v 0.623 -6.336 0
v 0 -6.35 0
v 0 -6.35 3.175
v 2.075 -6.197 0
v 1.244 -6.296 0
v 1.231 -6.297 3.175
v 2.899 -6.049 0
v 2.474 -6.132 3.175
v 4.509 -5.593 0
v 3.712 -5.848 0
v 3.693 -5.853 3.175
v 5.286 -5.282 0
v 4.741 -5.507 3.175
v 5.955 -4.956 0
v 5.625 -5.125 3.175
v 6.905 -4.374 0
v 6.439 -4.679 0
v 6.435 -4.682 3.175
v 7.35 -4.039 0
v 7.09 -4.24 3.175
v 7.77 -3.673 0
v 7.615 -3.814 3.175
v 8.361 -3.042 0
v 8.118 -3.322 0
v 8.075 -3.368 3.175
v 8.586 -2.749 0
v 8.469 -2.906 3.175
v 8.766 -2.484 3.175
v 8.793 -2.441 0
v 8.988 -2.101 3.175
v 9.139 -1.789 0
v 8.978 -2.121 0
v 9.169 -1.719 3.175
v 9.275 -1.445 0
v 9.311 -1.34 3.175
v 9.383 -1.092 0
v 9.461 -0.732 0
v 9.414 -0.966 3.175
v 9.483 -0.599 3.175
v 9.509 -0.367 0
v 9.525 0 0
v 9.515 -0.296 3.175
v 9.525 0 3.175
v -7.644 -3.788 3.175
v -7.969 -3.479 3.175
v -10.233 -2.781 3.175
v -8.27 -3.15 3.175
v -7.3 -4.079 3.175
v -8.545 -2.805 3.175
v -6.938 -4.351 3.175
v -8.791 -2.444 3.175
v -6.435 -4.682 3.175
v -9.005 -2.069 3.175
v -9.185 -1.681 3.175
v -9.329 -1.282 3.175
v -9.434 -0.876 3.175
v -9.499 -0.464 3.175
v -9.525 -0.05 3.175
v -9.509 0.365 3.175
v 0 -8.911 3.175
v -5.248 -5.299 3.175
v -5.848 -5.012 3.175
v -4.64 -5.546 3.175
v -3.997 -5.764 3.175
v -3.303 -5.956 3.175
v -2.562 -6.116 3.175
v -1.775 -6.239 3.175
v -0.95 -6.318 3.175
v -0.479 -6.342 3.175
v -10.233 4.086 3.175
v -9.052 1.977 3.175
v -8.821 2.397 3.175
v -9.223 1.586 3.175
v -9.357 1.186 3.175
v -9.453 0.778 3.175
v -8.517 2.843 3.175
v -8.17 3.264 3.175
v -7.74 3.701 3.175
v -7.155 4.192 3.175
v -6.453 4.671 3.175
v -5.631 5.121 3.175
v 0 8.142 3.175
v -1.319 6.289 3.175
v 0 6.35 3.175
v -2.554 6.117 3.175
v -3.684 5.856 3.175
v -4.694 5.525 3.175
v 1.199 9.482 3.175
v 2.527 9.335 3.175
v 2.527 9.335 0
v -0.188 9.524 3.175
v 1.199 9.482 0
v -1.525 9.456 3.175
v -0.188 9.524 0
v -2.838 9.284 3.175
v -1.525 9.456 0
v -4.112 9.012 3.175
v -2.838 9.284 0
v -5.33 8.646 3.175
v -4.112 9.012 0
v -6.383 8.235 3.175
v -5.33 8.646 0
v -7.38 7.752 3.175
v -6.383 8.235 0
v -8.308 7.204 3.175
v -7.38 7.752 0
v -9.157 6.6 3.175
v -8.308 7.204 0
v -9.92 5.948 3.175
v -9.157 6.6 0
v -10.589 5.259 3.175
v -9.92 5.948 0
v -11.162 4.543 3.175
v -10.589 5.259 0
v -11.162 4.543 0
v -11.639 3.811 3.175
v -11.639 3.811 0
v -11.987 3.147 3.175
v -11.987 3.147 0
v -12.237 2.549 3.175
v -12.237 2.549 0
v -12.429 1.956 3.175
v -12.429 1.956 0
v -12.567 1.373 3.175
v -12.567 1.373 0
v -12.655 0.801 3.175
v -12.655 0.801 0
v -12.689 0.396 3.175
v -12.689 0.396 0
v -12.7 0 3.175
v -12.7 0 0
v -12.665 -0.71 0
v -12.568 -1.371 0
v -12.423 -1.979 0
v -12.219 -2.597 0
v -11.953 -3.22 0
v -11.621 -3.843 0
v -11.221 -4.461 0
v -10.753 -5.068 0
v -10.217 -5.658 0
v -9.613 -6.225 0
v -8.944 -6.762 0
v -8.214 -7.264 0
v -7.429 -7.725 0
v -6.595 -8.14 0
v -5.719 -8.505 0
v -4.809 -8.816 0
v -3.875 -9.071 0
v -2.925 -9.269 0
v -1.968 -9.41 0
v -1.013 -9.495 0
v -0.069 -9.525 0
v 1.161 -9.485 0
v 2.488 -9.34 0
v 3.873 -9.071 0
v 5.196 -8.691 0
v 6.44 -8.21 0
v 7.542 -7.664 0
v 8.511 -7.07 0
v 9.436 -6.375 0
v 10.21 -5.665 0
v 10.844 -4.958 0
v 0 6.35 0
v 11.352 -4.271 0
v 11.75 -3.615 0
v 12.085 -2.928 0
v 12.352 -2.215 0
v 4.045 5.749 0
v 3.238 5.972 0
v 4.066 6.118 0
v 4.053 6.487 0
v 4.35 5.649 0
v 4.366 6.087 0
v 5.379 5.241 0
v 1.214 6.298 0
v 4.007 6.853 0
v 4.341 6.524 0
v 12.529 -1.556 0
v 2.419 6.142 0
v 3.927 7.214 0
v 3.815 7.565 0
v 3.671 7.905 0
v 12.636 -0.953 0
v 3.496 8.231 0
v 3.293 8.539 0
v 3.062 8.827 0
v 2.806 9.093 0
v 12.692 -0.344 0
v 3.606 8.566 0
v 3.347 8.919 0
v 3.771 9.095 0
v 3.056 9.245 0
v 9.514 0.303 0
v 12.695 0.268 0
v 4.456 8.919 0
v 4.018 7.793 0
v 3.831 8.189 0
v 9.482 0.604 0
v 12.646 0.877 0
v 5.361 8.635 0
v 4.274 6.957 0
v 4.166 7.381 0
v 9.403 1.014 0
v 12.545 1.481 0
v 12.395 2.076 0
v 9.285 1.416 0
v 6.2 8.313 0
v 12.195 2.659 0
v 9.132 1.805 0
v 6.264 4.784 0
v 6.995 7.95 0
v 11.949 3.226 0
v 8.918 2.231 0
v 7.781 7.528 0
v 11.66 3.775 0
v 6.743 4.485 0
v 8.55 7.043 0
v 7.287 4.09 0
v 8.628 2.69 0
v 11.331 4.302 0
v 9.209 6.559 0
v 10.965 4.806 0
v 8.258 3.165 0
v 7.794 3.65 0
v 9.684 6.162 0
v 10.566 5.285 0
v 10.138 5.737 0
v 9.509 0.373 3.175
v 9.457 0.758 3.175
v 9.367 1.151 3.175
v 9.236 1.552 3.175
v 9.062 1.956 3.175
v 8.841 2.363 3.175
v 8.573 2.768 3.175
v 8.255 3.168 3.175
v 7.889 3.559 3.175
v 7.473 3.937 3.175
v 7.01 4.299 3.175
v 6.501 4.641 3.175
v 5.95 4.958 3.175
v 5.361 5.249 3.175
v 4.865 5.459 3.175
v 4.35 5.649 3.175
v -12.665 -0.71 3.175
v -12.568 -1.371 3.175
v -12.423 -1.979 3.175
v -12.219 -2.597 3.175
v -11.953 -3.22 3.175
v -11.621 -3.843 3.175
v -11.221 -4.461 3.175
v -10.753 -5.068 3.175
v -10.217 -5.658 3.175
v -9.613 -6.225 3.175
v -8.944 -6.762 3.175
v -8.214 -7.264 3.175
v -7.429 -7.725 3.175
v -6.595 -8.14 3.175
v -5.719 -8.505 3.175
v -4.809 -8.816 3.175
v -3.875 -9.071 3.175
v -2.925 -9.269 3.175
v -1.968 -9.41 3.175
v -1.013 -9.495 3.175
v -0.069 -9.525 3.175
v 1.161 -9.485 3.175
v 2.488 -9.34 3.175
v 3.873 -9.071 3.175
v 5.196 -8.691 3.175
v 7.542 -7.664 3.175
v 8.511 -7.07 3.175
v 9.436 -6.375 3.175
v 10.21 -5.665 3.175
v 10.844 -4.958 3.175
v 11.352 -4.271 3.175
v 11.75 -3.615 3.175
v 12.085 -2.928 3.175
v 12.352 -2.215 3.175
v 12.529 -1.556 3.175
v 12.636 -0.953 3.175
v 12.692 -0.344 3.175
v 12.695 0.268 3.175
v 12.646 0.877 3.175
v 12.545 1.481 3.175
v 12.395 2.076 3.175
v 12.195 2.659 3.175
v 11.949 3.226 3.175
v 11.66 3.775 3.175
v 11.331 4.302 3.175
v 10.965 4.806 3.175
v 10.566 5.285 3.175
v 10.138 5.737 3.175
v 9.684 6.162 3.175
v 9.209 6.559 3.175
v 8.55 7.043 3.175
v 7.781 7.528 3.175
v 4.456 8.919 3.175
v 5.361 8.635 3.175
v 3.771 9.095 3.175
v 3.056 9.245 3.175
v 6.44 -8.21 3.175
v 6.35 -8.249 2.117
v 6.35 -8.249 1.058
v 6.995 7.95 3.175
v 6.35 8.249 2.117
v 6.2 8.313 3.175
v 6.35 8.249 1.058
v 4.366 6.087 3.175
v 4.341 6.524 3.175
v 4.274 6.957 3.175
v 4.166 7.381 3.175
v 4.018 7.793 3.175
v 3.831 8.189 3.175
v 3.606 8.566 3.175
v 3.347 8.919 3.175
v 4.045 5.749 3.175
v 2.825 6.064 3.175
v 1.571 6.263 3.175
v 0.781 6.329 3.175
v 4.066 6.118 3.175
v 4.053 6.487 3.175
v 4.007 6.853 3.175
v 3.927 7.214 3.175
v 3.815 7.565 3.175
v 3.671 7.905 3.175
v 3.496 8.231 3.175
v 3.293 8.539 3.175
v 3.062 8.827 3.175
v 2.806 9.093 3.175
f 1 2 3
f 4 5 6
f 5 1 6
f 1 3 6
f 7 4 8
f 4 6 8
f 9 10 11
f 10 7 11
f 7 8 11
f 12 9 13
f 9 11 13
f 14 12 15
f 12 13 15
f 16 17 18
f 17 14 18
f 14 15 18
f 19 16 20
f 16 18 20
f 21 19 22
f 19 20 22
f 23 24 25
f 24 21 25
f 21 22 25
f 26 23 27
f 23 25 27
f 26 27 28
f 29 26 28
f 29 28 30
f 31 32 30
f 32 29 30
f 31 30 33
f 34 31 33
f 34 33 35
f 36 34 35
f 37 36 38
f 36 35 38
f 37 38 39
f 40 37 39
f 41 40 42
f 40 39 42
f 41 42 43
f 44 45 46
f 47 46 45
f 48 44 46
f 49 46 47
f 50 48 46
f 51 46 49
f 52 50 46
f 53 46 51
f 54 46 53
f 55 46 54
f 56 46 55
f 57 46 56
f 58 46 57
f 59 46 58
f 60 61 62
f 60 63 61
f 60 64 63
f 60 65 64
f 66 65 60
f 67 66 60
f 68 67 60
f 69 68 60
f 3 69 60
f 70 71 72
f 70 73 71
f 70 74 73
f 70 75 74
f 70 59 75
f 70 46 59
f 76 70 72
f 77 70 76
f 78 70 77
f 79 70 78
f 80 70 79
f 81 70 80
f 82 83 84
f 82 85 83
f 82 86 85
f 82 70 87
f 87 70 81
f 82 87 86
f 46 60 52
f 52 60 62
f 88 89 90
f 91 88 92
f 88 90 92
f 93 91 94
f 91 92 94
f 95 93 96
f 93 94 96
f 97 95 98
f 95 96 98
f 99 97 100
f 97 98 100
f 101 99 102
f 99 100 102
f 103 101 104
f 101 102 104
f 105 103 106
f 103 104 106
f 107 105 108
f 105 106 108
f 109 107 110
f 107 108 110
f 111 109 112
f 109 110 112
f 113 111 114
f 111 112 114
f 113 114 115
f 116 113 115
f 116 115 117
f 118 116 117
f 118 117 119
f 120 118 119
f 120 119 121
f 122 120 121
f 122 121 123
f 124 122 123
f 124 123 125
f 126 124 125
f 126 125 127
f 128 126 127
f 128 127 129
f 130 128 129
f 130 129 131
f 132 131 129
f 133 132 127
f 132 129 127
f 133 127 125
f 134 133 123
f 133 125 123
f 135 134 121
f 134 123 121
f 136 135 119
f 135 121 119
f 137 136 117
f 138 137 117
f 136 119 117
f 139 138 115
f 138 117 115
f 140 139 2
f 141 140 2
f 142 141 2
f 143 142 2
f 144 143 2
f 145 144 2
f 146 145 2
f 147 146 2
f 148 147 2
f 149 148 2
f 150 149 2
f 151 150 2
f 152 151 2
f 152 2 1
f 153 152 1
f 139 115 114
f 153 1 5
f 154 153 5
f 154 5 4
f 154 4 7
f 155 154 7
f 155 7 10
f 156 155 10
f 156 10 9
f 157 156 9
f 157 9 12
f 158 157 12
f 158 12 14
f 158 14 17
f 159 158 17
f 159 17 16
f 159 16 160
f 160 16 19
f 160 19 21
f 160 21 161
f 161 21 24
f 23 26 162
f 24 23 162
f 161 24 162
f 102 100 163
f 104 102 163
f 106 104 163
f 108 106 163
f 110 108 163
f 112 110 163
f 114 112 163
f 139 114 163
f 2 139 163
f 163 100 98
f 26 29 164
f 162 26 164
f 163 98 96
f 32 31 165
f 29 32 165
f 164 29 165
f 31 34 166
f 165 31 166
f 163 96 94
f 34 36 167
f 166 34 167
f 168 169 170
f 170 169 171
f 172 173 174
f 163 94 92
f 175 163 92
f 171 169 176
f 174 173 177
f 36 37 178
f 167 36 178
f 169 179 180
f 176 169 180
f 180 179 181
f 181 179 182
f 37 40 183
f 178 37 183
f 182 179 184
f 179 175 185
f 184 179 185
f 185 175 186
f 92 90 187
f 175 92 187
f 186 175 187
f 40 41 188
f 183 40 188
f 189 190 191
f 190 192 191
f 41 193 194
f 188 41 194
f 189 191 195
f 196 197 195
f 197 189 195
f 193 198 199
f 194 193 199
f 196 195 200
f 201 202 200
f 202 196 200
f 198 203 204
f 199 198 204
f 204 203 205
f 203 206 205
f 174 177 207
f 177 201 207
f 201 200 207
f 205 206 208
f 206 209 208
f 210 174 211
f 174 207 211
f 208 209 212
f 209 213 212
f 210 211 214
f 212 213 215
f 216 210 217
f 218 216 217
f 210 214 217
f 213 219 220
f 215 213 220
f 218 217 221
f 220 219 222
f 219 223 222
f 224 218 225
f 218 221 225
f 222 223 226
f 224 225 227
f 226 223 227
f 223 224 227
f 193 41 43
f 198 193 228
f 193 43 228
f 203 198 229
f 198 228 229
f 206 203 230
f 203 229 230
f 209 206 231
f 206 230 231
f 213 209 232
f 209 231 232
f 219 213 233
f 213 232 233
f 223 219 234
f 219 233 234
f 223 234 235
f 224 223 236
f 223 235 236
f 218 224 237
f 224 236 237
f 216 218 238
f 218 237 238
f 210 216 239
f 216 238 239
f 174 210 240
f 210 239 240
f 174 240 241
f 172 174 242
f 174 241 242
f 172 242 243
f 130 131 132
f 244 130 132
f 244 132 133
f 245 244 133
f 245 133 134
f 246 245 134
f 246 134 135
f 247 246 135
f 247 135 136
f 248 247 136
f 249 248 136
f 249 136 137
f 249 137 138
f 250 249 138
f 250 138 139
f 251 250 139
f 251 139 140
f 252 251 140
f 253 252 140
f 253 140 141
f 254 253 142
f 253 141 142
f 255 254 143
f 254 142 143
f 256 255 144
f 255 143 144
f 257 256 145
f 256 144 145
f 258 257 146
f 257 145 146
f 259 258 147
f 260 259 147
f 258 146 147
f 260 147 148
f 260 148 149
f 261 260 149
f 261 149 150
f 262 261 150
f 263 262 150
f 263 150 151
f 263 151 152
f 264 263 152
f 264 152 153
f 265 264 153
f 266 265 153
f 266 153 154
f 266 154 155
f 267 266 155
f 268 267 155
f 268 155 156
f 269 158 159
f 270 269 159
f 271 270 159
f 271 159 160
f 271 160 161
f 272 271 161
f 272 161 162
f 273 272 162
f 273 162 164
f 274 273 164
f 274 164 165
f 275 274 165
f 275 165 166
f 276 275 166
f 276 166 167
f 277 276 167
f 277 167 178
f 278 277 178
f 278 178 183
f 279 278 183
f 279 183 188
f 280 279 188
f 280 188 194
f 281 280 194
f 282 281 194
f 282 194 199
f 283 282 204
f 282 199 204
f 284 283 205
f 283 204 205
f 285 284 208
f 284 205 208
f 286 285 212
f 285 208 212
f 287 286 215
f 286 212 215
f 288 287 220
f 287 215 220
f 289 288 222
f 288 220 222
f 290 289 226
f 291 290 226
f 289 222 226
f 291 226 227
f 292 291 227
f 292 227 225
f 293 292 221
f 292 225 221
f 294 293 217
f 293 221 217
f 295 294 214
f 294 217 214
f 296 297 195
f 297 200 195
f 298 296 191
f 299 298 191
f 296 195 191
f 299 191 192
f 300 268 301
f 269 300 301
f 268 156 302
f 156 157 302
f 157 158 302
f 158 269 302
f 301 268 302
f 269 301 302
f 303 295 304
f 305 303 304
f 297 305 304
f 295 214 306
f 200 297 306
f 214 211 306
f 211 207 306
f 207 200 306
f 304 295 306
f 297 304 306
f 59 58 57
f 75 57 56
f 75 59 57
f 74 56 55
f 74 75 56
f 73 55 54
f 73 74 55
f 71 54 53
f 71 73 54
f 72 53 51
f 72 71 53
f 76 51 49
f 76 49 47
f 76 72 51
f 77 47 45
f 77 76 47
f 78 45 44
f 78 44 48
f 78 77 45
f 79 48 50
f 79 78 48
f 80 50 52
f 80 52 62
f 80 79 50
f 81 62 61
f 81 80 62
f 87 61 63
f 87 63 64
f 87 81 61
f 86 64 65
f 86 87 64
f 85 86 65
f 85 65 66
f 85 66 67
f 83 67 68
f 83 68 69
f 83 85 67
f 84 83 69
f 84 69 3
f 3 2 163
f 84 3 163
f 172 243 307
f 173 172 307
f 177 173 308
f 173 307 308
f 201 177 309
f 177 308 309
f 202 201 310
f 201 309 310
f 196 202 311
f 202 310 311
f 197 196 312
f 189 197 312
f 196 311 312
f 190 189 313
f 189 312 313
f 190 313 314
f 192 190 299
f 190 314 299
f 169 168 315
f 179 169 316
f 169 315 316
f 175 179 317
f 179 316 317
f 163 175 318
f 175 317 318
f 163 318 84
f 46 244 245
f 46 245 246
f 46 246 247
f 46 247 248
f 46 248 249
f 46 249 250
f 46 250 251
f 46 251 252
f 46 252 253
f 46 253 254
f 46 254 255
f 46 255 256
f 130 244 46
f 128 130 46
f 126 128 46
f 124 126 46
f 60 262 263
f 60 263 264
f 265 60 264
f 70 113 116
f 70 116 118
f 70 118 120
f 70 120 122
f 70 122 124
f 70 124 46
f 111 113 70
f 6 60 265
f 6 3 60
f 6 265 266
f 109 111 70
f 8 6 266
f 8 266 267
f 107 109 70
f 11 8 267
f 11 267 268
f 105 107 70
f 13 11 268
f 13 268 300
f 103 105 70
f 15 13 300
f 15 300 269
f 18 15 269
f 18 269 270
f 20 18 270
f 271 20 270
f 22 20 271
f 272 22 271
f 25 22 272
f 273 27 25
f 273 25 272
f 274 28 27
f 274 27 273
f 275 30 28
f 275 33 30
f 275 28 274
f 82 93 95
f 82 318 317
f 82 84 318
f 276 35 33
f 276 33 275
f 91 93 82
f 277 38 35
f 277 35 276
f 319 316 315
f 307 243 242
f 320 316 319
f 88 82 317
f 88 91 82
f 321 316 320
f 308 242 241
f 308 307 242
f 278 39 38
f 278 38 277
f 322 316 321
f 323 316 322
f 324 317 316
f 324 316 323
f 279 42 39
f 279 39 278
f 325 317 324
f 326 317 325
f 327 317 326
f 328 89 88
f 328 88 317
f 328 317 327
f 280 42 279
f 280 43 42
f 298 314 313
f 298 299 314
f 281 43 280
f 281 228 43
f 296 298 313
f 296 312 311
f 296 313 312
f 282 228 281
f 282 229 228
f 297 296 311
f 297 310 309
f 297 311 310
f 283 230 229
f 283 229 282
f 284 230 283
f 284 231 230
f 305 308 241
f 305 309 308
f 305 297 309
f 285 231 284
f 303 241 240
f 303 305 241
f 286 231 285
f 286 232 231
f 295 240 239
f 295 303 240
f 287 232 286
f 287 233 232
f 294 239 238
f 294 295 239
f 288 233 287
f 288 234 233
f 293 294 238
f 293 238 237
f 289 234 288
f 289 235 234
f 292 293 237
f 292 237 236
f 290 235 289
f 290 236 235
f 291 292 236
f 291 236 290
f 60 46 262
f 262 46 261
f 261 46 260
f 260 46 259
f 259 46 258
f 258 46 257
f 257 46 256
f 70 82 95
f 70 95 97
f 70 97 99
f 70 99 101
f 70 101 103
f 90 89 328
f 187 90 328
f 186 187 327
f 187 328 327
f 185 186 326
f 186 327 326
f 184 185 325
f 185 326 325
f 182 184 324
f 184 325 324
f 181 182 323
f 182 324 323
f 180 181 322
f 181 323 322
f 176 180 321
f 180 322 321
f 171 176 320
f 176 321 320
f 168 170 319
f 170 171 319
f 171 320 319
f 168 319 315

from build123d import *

# Parameters (mm, degrees)
F1_DEPTH = 3.175
F3_DEPTH = 25.4
F5_DEPTH = 3.175
F7_DEPTH = 25.4


with BuildPart() as f1:
    # F0 (on Top) → F1 (new body)
    with BuildSketch(Plane.XY):
        with BuildLine():
            add(Edge.make_bspline(
                [(-12.7, 0), (-12.7, -16.4977839421), (6.35, -8.248891971), (25.4, 0), (6.35, 8.248891971), (-12.7, 16.4977839421), (-12.7, 0)],
                knots=[0, 0, 0, 2.0943951024, 2.0943951024, 4.1887902048, 4.1887902048, 6.2831853072, 6.2831853072, 6.2831853072], degree=2, weights=[1, 0.5, 1, 0.5, 1, 0.5, 1]))
        make_face()
    extrude(amount=F1_DEPTH)

    # F2 (on face) → F3 (cut)
    with BuildSketch(Plane.XY.offset(3.175)):
        with BuildLine():
            add(Edge.make_bspline(
                [(9.525, 0), (9.525, 10.9985226281), (-4.7625, 5.499261314), (-19.05, 0), (-4.7625, -5.499261314), (9.525, -10.9985226281), (9.525, 0)],
                knots=[0, 0, 0, 2.0943951024, 2.0943951024, 4.1887902048, 4.1887902048, 6.2831853072, 6.2831853072, 6.2831853072], degree=2, weights=[1, 0.5, 1, 0.5, 1, 0.5, 1]))
        make_face()
    extrude(amount=-F3_DEPTH, mode=Mode.SUBTRACT)

    # F4 (on Top) → F5 (join)
    with BuildSketch(Plane.XY):
        Polygon((0, -8.9111542329), (0, 8.1416685134), (-10.233101435, 4.0858616121), (-10.233101435, -2.7813557535), align=None)
    extrude(amount=F5_DEPTH)

    # F6 (on face) → F7 (cut)
    with BuildSketch(Plane.XY.offset(3.175)):
        with BuildLine():
            ThreePointArc((2.5266178398, 9.334599016), (3.7464169195, 7.7368947977), (4.0447358353, 5.7490380653))
            ThreePointArc((4.0447358353, 5.7490380653), (4.1637538527, 5.5969636499), (4.3496567574, 5.6492324392))
            ThreePointArc((4.3496567574, 5.6492324392), (4.0968642454, 7.5891250366), (3.0555001293, 9.2452192735))
            ThreePointArc((3.0555001293, 9.2452192735), (2.8151884248, 9.4326890771), (2.5266178398, 9.334599016))
        make_face()
    extrude(amount=-F7_DEPTH, mode=Mode.SUBTRACT)


solid = f1.part
